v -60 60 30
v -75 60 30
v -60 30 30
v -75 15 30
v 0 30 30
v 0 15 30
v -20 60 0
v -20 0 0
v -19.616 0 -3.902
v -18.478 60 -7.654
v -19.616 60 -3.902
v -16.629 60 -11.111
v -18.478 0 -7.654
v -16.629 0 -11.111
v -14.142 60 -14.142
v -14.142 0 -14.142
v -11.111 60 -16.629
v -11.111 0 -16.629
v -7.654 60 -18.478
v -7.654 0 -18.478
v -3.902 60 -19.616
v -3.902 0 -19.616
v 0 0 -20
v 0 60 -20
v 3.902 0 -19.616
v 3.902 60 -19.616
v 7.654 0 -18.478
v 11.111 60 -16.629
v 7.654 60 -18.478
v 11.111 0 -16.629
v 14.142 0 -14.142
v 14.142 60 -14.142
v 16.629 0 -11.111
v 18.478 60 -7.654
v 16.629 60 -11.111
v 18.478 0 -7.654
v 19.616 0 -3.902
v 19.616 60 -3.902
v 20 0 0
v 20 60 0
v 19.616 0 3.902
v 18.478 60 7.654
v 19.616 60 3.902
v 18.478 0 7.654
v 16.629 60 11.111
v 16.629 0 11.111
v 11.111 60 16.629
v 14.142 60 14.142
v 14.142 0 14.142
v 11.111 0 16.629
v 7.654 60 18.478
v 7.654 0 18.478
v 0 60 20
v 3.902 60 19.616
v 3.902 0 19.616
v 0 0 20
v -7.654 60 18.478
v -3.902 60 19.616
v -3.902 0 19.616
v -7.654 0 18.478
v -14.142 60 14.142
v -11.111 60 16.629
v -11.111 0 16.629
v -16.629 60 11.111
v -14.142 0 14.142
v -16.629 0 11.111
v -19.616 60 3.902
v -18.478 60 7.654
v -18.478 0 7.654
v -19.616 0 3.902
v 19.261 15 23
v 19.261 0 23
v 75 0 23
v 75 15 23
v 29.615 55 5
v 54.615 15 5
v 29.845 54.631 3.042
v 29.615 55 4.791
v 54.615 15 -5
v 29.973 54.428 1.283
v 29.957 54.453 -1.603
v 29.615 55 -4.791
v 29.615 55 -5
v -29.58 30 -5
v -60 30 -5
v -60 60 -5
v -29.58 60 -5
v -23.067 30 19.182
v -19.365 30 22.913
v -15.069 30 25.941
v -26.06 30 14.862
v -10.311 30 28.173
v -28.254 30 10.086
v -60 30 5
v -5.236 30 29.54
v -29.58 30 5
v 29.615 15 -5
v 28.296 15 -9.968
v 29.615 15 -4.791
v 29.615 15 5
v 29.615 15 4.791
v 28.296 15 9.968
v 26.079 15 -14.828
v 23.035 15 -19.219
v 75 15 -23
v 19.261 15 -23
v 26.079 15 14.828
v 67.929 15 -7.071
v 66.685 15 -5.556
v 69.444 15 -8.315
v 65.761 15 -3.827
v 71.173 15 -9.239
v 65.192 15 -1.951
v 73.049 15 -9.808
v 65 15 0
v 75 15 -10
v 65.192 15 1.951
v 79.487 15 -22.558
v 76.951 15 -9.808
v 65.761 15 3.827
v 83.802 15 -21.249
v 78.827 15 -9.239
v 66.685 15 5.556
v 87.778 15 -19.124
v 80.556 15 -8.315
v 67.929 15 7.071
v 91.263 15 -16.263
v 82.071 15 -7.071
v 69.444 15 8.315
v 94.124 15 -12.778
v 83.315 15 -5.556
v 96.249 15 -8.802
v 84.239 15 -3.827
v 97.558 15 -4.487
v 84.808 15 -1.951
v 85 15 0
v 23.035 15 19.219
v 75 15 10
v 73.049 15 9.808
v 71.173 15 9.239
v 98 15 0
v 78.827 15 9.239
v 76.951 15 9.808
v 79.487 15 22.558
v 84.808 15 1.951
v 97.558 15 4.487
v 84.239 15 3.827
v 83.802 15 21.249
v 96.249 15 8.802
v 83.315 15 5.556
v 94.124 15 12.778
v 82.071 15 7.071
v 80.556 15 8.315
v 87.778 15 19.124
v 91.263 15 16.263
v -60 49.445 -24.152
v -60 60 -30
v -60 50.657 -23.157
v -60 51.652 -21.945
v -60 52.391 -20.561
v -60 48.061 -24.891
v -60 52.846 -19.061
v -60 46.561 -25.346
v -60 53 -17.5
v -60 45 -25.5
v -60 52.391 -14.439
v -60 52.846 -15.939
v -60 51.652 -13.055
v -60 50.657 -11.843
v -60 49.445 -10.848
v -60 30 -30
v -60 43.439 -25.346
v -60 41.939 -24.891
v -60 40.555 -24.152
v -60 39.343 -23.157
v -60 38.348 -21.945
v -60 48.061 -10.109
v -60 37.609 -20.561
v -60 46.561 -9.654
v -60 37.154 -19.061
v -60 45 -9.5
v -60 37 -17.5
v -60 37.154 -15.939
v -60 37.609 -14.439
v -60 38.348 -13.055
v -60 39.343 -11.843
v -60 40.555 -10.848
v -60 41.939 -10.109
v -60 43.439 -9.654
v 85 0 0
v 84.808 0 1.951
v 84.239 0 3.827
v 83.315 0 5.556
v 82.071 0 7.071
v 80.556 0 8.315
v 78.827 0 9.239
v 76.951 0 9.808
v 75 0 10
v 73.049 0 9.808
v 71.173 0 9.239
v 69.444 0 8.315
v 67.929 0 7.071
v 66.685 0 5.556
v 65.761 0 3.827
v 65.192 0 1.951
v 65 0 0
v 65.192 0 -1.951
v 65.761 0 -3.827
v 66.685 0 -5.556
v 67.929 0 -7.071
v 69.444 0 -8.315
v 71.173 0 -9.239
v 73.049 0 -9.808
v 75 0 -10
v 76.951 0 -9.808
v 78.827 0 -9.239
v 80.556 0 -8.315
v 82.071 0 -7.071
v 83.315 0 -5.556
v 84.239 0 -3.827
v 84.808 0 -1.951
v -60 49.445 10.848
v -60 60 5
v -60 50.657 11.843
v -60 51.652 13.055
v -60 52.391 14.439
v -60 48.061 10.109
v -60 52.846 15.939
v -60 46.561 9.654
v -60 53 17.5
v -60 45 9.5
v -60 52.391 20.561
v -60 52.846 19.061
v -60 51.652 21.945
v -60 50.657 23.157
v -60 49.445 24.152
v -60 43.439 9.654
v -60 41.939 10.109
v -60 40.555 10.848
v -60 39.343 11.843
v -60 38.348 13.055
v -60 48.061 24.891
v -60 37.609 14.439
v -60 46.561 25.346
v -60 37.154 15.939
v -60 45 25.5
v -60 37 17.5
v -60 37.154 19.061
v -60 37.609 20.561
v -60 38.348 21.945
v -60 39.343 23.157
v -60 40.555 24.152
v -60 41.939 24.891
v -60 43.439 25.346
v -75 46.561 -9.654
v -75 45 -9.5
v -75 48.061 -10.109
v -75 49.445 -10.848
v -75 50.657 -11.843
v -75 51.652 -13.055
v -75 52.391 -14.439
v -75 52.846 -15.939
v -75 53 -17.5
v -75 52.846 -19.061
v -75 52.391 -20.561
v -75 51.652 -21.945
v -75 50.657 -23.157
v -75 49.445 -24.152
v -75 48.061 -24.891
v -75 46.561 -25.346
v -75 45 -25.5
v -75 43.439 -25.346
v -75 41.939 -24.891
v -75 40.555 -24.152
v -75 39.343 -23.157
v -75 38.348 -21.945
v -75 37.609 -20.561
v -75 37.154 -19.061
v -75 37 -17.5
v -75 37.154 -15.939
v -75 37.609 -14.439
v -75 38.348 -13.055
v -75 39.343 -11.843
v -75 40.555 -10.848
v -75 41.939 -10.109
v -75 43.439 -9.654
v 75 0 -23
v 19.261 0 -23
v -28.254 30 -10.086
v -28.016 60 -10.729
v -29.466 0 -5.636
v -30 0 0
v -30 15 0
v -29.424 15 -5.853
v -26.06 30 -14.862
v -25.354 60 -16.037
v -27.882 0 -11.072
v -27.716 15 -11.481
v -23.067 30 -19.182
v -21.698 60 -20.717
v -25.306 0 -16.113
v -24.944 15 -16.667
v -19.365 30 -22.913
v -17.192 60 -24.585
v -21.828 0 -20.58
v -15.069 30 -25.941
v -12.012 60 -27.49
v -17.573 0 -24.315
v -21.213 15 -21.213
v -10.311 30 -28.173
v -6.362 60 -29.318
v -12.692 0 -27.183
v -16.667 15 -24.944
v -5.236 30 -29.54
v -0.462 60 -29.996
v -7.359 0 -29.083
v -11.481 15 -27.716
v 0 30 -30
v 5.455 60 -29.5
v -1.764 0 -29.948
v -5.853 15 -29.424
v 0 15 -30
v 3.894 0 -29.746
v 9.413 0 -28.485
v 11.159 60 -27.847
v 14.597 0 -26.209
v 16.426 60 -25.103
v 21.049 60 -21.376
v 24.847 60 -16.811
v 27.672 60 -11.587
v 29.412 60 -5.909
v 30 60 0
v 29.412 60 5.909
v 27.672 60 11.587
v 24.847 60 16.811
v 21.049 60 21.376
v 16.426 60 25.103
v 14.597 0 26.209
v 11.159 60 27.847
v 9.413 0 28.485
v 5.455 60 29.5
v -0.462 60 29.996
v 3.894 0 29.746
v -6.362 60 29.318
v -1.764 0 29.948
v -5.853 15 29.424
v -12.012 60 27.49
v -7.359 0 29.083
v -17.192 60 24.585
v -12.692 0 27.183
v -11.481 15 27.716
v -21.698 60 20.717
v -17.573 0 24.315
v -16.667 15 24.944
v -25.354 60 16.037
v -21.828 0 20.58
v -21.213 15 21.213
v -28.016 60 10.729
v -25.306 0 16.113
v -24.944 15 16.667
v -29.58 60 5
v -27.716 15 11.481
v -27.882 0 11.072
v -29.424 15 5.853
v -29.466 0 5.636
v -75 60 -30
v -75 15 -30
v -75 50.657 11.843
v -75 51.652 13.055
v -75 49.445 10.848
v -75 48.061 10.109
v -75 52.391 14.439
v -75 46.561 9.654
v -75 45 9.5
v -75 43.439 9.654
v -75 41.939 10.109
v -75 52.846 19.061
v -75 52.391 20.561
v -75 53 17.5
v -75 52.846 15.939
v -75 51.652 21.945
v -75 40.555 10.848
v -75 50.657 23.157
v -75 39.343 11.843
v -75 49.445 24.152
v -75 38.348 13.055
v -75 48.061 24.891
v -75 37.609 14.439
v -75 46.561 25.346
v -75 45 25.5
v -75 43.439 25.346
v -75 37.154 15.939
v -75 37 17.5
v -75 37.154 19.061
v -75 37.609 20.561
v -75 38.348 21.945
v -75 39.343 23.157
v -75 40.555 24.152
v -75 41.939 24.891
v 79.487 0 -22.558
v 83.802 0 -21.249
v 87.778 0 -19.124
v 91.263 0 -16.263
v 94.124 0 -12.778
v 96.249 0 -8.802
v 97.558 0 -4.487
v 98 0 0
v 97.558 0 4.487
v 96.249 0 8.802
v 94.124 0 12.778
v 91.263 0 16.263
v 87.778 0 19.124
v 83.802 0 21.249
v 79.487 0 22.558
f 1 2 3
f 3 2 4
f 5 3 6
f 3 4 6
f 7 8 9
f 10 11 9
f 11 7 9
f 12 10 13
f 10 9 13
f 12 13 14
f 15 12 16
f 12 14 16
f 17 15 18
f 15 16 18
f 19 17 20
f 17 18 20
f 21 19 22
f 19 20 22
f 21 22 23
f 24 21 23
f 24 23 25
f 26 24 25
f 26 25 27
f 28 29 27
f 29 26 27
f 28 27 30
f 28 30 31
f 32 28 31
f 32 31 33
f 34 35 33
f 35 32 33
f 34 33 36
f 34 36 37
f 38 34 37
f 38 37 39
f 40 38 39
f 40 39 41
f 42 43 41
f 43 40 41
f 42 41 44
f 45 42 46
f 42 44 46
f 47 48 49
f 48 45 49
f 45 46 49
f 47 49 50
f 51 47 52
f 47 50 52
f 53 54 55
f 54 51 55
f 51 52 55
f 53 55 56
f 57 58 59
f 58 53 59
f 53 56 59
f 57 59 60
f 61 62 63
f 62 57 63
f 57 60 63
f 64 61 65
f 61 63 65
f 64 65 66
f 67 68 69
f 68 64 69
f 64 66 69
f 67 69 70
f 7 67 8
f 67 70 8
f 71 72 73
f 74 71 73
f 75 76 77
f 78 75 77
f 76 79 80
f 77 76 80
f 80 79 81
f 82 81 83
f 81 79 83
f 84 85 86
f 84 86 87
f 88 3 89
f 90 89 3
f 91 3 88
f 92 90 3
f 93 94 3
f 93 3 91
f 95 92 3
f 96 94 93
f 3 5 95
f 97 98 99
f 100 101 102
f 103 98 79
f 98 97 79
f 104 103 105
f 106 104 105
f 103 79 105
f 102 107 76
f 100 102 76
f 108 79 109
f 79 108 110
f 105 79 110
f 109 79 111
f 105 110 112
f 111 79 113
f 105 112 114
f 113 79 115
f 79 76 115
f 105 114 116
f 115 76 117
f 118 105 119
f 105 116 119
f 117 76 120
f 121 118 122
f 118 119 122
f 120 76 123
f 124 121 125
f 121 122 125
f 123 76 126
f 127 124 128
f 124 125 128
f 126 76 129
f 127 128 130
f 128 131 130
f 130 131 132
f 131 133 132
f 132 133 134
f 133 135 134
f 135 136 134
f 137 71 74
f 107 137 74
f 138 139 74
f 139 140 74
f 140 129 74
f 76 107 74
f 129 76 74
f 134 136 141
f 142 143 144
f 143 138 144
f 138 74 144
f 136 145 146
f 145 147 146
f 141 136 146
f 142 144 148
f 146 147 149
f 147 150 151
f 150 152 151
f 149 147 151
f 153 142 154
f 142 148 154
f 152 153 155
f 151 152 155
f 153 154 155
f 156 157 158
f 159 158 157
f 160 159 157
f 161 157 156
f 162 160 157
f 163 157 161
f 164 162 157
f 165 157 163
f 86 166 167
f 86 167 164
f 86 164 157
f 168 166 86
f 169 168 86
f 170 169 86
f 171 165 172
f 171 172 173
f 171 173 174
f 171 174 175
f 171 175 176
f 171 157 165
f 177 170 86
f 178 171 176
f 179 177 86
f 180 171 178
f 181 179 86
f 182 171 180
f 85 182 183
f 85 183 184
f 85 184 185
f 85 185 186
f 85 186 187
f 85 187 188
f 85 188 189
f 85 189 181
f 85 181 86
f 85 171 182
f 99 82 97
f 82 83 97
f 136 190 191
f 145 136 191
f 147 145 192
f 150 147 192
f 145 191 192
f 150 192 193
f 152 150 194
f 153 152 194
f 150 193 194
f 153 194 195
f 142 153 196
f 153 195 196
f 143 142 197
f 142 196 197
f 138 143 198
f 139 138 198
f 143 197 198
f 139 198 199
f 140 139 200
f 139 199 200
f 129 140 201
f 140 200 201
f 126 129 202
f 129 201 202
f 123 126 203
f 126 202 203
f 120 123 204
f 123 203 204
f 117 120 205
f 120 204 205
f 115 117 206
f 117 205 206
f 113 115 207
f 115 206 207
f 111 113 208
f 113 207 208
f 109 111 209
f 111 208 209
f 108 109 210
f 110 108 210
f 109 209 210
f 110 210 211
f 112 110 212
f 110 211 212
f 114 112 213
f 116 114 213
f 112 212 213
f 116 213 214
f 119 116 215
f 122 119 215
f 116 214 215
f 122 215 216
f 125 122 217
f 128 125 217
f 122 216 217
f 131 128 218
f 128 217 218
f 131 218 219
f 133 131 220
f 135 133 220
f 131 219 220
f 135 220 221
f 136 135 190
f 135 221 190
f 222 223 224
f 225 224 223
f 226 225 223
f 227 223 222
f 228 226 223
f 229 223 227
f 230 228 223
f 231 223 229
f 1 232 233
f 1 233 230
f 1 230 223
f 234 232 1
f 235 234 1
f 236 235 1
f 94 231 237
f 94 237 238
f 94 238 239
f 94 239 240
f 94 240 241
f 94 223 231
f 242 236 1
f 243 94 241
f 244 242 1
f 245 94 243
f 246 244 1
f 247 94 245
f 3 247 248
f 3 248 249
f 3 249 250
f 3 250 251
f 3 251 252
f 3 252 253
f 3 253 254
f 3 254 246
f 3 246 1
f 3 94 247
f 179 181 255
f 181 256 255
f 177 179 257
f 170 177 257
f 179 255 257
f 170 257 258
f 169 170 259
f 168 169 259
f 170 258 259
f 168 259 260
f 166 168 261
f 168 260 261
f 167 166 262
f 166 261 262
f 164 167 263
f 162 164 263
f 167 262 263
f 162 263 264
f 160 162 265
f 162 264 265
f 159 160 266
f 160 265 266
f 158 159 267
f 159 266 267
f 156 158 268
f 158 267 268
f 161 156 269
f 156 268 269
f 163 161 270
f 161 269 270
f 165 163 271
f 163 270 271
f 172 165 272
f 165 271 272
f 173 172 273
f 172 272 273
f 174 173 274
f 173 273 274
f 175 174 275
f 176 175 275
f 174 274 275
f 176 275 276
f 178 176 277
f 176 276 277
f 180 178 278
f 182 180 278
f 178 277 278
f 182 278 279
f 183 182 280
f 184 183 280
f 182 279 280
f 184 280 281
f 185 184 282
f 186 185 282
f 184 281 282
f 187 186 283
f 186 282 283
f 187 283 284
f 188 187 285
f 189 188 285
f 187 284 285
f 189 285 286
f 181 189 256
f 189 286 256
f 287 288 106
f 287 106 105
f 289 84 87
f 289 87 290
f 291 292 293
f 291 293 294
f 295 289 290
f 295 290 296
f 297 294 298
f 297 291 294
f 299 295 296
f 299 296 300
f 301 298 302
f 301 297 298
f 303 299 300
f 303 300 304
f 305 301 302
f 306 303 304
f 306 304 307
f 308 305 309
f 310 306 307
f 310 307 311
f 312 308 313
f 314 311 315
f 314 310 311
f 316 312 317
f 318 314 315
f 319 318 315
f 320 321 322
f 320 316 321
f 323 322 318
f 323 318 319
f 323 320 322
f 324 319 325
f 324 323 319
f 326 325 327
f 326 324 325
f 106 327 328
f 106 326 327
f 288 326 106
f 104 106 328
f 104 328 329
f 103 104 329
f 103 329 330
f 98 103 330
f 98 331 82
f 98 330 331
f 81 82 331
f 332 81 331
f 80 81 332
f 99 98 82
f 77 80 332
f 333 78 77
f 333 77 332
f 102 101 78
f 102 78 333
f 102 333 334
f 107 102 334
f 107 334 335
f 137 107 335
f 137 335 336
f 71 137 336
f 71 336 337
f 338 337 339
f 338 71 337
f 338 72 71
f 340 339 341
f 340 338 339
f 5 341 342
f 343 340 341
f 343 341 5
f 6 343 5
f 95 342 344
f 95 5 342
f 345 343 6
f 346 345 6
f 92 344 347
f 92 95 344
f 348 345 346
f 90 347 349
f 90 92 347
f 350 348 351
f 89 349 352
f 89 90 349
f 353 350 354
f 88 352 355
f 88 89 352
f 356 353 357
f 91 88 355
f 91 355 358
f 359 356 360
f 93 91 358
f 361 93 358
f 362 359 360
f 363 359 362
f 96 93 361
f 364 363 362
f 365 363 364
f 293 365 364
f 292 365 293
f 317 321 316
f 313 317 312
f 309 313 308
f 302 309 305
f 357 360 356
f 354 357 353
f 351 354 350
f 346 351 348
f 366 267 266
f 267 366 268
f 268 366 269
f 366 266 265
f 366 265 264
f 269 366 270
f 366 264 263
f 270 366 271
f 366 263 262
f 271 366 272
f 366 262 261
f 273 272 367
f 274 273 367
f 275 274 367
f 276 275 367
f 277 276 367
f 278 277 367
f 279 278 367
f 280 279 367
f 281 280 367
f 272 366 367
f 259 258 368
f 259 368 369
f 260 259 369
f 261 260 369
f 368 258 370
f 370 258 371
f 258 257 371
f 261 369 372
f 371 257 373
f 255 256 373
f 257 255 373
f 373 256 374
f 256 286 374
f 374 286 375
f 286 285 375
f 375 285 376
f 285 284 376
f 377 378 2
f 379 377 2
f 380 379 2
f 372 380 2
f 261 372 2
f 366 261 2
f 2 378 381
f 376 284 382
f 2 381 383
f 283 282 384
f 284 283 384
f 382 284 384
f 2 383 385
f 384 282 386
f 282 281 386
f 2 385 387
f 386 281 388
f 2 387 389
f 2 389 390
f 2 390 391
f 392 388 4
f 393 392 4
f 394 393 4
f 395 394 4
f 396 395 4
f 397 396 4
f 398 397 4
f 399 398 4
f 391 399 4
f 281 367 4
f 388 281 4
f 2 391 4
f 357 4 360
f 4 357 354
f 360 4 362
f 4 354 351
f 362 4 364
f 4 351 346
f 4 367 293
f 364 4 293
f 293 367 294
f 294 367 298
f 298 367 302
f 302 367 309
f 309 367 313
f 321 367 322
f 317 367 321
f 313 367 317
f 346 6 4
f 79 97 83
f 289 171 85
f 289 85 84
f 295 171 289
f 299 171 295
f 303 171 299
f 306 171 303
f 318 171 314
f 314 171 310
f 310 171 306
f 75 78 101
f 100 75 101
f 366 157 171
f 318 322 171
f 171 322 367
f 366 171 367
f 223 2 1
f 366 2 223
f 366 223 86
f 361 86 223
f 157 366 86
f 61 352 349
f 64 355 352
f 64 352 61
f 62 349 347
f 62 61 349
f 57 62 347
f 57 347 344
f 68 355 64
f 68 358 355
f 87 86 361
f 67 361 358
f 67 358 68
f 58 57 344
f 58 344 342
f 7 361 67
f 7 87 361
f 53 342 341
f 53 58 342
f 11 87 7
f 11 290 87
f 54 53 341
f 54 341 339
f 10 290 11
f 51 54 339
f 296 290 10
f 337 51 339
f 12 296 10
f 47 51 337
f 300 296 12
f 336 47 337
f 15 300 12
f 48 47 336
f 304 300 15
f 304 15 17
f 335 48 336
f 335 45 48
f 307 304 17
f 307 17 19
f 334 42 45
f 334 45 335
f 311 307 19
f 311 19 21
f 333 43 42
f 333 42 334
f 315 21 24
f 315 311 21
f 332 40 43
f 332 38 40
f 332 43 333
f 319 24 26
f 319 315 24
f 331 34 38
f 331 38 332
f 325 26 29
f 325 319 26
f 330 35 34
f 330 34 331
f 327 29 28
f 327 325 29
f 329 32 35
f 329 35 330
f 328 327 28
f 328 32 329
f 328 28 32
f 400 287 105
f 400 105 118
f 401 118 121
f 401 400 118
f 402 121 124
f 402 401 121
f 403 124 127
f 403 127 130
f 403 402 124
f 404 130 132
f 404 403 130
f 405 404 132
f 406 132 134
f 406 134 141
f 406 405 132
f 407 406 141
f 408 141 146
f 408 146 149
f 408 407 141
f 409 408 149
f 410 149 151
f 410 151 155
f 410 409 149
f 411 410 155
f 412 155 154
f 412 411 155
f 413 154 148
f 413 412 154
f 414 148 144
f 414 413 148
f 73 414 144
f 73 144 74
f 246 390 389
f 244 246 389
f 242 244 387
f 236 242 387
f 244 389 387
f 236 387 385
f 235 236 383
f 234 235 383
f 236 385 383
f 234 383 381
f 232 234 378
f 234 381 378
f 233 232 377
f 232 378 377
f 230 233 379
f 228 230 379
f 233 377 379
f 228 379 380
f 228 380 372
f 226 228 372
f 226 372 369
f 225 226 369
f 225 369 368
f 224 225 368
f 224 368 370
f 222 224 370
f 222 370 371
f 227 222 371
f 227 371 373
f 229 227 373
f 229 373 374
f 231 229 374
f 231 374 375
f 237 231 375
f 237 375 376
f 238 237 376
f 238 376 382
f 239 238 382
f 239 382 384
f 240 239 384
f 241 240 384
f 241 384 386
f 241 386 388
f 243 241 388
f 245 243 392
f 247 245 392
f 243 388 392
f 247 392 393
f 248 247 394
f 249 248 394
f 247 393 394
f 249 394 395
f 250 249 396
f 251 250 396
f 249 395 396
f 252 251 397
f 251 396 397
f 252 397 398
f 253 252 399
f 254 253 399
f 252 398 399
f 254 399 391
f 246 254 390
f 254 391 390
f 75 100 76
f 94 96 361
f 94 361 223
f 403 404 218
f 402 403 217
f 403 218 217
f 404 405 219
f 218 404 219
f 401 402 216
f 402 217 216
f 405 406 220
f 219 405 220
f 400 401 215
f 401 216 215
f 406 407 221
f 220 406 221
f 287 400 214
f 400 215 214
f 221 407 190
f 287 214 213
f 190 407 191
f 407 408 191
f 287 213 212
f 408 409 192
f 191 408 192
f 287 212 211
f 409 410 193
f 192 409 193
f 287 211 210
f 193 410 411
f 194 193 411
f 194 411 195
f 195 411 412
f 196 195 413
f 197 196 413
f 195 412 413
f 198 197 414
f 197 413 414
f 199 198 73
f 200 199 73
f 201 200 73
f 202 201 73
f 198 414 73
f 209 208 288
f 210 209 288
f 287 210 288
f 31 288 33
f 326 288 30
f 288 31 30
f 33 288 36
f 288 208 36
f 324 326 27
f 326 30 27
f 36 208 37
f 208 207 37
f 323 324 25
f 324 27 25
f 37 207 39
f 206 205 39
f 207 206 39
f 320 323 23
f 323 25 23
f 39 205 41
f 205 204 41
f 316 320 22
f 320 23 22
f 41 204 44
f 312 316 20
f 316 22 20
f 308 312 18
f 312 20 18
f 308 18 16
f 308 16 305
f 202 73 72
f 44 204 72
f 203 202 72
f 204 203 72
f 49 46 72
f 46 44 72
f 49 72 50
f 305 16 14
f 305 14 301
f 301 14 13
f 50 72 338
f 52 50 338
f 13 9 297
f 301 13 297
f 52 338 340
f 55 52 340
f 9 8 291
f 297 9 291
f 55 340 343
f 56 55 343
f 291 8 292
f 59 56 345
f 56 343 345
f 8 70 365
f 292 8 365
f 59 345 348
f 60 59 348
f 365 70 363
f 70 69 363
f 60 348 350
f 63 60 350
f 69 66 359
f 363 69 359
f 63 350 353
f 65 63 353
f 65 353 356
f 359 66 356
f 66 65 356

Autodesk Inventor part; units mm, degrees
ref_plane "YZ Plane" through (0, 0, 0) normal (1, 0, 0) x (0, 1, 0)
ref_plane "XZ Plane" through (0, 0, 0) normal (0, 1, 0) x (-1, 0, 0)
ref_plane "XY Plane" through (0, 0, 0) normal (0, 0, 1) x (1, 0, 0)
sketch "Sketch1" plane through (0, 0, 0) normal (0, 1, 0) x (-1, 0, 0)
  circle A0 centre (0, 0) radius 30
  circle A1 centre (0, 0) radius 20
  dimension "d0" = 60
  dimension "d1" = 40
extrude "Extrusion1" add sketch "Sketch1" along normal blind 60
sketch "Sketch2" plane through (0, 0, 0) normal (0, -1, 0) x (1, 0, 0)
  circle A0 centre (75, 0) radius 10
  arc A1 (75, -23) -> (75, 23) centre (75, 0) ccw
  circle A2 centre (0, 0) radius 30 projected
  line L0 (19.2614, 23) -> (75, 23)
  line L1 (19.2614, -23) -> (75, -23)
  dimension "d4" = 20
  dimension "d5" = 46
  dimension "d8" = 75
extrude "Extrusion2" add sketch "Sketch2" against normal blind 15 contours L1 A2 L0 A1
sketch "Sketch3" plane through (0, 15, 0) normal (0, 1, 0) x (1, 0, 0)
  line L0 (-75, -30) -> (0, -30)
  line L1 (0, -30) -> (0, 30)
  line L2 (0, 30) -> (-75, 30)
  line L3 (-75, 30) -> (-75, -30)
  arc A0 (19.2614, 23) -> (19.2614, -23) centre (0, 0) ccw projected
  dimension "d11" = 60
  dimension "d12" = 75
extrude "Extrusion3" add sketch "Sketch3" along normal blind 15 contours L3 L2 A0 L0
sketch "Sketch4" plane through (0, 30, 0) normal (0, 1, 0) x (1, 0, 0)
  line L0 (-75, 30) -> (-60, 30)
  line L1 (-60, 30) -> (-60, -30)
  line L2 (-60, -30) -> (-75, -30)
  line L3 (-75, -30) -> (-75, 30)
  line L4 (0, 30) -> (-75, 30) projected
  line L5 (-75, 30) -> (-75, -30) projected
  line L6 (-75, -30) -> (0, -30) projected
  line L7 (-60, 5) -> (-29.5804, 5)
  line L8 (-29.5804, 5) -> (-29.5804, -5)
  line L9 (-29.5804, -5) -> (-60, -5)
  line L10 (-60, -5) -> (-60, 5)
  circle A0 centre (0, 0) radius 30 projected
  dimension "d15" = 15
  dimension "d16" = 10
extrude "Extrusion4" add sketch "Sketch4" along normal blind 30 contours L0 L1 L2 L3 | L7 A0 L9 L1 | L8 A0 picked at (-29.7047, 0.5579)
sketch "Sketch5" plane through (-75, 15, -30) normal (-1, 0, 0) x (0, 0, 1)
  circle A0 centre (12.5, 30) radius 8
  circle A1 centre (47.5, 30) radius 8
  line L0 (60, 0) -> (60, 45) projected
  line L1 (0, 45) -> (60, 45) projected
  point P0 (30, -15)
  dimension "d19" = 16
  dimension "d20" = 35
  dimension "d21" = 12.5
  dimension "d22" = 15
extrude "Extrusion5" cut sketch "Sketch5" against normal up to surface (15 mm away)
sketch "Sketch6" plane through (0, 0, 0) normal (0, 0, 1) x (1, 0, 0)
  line L0 (29.615, 55) -> (29.615, 15)
  line L1 (29.615, 15) -> (54.615, 15)
  line L2 (54.615, 15) -> (29.615, 55)
  line L3 (19.2614, 15) -> (75, 15) projected
  line L4 (29.998, 59.9996) -> (29.998, 15) construction
  point P0 (0, 0)
  dimension "d25" = 25
  dimension "d26" = 40
  dimension "d27" = 0.383
extrude "Extrusion6" add sketch "Sketch6" along normal mid plane 10
properties part number "Exercise03"
